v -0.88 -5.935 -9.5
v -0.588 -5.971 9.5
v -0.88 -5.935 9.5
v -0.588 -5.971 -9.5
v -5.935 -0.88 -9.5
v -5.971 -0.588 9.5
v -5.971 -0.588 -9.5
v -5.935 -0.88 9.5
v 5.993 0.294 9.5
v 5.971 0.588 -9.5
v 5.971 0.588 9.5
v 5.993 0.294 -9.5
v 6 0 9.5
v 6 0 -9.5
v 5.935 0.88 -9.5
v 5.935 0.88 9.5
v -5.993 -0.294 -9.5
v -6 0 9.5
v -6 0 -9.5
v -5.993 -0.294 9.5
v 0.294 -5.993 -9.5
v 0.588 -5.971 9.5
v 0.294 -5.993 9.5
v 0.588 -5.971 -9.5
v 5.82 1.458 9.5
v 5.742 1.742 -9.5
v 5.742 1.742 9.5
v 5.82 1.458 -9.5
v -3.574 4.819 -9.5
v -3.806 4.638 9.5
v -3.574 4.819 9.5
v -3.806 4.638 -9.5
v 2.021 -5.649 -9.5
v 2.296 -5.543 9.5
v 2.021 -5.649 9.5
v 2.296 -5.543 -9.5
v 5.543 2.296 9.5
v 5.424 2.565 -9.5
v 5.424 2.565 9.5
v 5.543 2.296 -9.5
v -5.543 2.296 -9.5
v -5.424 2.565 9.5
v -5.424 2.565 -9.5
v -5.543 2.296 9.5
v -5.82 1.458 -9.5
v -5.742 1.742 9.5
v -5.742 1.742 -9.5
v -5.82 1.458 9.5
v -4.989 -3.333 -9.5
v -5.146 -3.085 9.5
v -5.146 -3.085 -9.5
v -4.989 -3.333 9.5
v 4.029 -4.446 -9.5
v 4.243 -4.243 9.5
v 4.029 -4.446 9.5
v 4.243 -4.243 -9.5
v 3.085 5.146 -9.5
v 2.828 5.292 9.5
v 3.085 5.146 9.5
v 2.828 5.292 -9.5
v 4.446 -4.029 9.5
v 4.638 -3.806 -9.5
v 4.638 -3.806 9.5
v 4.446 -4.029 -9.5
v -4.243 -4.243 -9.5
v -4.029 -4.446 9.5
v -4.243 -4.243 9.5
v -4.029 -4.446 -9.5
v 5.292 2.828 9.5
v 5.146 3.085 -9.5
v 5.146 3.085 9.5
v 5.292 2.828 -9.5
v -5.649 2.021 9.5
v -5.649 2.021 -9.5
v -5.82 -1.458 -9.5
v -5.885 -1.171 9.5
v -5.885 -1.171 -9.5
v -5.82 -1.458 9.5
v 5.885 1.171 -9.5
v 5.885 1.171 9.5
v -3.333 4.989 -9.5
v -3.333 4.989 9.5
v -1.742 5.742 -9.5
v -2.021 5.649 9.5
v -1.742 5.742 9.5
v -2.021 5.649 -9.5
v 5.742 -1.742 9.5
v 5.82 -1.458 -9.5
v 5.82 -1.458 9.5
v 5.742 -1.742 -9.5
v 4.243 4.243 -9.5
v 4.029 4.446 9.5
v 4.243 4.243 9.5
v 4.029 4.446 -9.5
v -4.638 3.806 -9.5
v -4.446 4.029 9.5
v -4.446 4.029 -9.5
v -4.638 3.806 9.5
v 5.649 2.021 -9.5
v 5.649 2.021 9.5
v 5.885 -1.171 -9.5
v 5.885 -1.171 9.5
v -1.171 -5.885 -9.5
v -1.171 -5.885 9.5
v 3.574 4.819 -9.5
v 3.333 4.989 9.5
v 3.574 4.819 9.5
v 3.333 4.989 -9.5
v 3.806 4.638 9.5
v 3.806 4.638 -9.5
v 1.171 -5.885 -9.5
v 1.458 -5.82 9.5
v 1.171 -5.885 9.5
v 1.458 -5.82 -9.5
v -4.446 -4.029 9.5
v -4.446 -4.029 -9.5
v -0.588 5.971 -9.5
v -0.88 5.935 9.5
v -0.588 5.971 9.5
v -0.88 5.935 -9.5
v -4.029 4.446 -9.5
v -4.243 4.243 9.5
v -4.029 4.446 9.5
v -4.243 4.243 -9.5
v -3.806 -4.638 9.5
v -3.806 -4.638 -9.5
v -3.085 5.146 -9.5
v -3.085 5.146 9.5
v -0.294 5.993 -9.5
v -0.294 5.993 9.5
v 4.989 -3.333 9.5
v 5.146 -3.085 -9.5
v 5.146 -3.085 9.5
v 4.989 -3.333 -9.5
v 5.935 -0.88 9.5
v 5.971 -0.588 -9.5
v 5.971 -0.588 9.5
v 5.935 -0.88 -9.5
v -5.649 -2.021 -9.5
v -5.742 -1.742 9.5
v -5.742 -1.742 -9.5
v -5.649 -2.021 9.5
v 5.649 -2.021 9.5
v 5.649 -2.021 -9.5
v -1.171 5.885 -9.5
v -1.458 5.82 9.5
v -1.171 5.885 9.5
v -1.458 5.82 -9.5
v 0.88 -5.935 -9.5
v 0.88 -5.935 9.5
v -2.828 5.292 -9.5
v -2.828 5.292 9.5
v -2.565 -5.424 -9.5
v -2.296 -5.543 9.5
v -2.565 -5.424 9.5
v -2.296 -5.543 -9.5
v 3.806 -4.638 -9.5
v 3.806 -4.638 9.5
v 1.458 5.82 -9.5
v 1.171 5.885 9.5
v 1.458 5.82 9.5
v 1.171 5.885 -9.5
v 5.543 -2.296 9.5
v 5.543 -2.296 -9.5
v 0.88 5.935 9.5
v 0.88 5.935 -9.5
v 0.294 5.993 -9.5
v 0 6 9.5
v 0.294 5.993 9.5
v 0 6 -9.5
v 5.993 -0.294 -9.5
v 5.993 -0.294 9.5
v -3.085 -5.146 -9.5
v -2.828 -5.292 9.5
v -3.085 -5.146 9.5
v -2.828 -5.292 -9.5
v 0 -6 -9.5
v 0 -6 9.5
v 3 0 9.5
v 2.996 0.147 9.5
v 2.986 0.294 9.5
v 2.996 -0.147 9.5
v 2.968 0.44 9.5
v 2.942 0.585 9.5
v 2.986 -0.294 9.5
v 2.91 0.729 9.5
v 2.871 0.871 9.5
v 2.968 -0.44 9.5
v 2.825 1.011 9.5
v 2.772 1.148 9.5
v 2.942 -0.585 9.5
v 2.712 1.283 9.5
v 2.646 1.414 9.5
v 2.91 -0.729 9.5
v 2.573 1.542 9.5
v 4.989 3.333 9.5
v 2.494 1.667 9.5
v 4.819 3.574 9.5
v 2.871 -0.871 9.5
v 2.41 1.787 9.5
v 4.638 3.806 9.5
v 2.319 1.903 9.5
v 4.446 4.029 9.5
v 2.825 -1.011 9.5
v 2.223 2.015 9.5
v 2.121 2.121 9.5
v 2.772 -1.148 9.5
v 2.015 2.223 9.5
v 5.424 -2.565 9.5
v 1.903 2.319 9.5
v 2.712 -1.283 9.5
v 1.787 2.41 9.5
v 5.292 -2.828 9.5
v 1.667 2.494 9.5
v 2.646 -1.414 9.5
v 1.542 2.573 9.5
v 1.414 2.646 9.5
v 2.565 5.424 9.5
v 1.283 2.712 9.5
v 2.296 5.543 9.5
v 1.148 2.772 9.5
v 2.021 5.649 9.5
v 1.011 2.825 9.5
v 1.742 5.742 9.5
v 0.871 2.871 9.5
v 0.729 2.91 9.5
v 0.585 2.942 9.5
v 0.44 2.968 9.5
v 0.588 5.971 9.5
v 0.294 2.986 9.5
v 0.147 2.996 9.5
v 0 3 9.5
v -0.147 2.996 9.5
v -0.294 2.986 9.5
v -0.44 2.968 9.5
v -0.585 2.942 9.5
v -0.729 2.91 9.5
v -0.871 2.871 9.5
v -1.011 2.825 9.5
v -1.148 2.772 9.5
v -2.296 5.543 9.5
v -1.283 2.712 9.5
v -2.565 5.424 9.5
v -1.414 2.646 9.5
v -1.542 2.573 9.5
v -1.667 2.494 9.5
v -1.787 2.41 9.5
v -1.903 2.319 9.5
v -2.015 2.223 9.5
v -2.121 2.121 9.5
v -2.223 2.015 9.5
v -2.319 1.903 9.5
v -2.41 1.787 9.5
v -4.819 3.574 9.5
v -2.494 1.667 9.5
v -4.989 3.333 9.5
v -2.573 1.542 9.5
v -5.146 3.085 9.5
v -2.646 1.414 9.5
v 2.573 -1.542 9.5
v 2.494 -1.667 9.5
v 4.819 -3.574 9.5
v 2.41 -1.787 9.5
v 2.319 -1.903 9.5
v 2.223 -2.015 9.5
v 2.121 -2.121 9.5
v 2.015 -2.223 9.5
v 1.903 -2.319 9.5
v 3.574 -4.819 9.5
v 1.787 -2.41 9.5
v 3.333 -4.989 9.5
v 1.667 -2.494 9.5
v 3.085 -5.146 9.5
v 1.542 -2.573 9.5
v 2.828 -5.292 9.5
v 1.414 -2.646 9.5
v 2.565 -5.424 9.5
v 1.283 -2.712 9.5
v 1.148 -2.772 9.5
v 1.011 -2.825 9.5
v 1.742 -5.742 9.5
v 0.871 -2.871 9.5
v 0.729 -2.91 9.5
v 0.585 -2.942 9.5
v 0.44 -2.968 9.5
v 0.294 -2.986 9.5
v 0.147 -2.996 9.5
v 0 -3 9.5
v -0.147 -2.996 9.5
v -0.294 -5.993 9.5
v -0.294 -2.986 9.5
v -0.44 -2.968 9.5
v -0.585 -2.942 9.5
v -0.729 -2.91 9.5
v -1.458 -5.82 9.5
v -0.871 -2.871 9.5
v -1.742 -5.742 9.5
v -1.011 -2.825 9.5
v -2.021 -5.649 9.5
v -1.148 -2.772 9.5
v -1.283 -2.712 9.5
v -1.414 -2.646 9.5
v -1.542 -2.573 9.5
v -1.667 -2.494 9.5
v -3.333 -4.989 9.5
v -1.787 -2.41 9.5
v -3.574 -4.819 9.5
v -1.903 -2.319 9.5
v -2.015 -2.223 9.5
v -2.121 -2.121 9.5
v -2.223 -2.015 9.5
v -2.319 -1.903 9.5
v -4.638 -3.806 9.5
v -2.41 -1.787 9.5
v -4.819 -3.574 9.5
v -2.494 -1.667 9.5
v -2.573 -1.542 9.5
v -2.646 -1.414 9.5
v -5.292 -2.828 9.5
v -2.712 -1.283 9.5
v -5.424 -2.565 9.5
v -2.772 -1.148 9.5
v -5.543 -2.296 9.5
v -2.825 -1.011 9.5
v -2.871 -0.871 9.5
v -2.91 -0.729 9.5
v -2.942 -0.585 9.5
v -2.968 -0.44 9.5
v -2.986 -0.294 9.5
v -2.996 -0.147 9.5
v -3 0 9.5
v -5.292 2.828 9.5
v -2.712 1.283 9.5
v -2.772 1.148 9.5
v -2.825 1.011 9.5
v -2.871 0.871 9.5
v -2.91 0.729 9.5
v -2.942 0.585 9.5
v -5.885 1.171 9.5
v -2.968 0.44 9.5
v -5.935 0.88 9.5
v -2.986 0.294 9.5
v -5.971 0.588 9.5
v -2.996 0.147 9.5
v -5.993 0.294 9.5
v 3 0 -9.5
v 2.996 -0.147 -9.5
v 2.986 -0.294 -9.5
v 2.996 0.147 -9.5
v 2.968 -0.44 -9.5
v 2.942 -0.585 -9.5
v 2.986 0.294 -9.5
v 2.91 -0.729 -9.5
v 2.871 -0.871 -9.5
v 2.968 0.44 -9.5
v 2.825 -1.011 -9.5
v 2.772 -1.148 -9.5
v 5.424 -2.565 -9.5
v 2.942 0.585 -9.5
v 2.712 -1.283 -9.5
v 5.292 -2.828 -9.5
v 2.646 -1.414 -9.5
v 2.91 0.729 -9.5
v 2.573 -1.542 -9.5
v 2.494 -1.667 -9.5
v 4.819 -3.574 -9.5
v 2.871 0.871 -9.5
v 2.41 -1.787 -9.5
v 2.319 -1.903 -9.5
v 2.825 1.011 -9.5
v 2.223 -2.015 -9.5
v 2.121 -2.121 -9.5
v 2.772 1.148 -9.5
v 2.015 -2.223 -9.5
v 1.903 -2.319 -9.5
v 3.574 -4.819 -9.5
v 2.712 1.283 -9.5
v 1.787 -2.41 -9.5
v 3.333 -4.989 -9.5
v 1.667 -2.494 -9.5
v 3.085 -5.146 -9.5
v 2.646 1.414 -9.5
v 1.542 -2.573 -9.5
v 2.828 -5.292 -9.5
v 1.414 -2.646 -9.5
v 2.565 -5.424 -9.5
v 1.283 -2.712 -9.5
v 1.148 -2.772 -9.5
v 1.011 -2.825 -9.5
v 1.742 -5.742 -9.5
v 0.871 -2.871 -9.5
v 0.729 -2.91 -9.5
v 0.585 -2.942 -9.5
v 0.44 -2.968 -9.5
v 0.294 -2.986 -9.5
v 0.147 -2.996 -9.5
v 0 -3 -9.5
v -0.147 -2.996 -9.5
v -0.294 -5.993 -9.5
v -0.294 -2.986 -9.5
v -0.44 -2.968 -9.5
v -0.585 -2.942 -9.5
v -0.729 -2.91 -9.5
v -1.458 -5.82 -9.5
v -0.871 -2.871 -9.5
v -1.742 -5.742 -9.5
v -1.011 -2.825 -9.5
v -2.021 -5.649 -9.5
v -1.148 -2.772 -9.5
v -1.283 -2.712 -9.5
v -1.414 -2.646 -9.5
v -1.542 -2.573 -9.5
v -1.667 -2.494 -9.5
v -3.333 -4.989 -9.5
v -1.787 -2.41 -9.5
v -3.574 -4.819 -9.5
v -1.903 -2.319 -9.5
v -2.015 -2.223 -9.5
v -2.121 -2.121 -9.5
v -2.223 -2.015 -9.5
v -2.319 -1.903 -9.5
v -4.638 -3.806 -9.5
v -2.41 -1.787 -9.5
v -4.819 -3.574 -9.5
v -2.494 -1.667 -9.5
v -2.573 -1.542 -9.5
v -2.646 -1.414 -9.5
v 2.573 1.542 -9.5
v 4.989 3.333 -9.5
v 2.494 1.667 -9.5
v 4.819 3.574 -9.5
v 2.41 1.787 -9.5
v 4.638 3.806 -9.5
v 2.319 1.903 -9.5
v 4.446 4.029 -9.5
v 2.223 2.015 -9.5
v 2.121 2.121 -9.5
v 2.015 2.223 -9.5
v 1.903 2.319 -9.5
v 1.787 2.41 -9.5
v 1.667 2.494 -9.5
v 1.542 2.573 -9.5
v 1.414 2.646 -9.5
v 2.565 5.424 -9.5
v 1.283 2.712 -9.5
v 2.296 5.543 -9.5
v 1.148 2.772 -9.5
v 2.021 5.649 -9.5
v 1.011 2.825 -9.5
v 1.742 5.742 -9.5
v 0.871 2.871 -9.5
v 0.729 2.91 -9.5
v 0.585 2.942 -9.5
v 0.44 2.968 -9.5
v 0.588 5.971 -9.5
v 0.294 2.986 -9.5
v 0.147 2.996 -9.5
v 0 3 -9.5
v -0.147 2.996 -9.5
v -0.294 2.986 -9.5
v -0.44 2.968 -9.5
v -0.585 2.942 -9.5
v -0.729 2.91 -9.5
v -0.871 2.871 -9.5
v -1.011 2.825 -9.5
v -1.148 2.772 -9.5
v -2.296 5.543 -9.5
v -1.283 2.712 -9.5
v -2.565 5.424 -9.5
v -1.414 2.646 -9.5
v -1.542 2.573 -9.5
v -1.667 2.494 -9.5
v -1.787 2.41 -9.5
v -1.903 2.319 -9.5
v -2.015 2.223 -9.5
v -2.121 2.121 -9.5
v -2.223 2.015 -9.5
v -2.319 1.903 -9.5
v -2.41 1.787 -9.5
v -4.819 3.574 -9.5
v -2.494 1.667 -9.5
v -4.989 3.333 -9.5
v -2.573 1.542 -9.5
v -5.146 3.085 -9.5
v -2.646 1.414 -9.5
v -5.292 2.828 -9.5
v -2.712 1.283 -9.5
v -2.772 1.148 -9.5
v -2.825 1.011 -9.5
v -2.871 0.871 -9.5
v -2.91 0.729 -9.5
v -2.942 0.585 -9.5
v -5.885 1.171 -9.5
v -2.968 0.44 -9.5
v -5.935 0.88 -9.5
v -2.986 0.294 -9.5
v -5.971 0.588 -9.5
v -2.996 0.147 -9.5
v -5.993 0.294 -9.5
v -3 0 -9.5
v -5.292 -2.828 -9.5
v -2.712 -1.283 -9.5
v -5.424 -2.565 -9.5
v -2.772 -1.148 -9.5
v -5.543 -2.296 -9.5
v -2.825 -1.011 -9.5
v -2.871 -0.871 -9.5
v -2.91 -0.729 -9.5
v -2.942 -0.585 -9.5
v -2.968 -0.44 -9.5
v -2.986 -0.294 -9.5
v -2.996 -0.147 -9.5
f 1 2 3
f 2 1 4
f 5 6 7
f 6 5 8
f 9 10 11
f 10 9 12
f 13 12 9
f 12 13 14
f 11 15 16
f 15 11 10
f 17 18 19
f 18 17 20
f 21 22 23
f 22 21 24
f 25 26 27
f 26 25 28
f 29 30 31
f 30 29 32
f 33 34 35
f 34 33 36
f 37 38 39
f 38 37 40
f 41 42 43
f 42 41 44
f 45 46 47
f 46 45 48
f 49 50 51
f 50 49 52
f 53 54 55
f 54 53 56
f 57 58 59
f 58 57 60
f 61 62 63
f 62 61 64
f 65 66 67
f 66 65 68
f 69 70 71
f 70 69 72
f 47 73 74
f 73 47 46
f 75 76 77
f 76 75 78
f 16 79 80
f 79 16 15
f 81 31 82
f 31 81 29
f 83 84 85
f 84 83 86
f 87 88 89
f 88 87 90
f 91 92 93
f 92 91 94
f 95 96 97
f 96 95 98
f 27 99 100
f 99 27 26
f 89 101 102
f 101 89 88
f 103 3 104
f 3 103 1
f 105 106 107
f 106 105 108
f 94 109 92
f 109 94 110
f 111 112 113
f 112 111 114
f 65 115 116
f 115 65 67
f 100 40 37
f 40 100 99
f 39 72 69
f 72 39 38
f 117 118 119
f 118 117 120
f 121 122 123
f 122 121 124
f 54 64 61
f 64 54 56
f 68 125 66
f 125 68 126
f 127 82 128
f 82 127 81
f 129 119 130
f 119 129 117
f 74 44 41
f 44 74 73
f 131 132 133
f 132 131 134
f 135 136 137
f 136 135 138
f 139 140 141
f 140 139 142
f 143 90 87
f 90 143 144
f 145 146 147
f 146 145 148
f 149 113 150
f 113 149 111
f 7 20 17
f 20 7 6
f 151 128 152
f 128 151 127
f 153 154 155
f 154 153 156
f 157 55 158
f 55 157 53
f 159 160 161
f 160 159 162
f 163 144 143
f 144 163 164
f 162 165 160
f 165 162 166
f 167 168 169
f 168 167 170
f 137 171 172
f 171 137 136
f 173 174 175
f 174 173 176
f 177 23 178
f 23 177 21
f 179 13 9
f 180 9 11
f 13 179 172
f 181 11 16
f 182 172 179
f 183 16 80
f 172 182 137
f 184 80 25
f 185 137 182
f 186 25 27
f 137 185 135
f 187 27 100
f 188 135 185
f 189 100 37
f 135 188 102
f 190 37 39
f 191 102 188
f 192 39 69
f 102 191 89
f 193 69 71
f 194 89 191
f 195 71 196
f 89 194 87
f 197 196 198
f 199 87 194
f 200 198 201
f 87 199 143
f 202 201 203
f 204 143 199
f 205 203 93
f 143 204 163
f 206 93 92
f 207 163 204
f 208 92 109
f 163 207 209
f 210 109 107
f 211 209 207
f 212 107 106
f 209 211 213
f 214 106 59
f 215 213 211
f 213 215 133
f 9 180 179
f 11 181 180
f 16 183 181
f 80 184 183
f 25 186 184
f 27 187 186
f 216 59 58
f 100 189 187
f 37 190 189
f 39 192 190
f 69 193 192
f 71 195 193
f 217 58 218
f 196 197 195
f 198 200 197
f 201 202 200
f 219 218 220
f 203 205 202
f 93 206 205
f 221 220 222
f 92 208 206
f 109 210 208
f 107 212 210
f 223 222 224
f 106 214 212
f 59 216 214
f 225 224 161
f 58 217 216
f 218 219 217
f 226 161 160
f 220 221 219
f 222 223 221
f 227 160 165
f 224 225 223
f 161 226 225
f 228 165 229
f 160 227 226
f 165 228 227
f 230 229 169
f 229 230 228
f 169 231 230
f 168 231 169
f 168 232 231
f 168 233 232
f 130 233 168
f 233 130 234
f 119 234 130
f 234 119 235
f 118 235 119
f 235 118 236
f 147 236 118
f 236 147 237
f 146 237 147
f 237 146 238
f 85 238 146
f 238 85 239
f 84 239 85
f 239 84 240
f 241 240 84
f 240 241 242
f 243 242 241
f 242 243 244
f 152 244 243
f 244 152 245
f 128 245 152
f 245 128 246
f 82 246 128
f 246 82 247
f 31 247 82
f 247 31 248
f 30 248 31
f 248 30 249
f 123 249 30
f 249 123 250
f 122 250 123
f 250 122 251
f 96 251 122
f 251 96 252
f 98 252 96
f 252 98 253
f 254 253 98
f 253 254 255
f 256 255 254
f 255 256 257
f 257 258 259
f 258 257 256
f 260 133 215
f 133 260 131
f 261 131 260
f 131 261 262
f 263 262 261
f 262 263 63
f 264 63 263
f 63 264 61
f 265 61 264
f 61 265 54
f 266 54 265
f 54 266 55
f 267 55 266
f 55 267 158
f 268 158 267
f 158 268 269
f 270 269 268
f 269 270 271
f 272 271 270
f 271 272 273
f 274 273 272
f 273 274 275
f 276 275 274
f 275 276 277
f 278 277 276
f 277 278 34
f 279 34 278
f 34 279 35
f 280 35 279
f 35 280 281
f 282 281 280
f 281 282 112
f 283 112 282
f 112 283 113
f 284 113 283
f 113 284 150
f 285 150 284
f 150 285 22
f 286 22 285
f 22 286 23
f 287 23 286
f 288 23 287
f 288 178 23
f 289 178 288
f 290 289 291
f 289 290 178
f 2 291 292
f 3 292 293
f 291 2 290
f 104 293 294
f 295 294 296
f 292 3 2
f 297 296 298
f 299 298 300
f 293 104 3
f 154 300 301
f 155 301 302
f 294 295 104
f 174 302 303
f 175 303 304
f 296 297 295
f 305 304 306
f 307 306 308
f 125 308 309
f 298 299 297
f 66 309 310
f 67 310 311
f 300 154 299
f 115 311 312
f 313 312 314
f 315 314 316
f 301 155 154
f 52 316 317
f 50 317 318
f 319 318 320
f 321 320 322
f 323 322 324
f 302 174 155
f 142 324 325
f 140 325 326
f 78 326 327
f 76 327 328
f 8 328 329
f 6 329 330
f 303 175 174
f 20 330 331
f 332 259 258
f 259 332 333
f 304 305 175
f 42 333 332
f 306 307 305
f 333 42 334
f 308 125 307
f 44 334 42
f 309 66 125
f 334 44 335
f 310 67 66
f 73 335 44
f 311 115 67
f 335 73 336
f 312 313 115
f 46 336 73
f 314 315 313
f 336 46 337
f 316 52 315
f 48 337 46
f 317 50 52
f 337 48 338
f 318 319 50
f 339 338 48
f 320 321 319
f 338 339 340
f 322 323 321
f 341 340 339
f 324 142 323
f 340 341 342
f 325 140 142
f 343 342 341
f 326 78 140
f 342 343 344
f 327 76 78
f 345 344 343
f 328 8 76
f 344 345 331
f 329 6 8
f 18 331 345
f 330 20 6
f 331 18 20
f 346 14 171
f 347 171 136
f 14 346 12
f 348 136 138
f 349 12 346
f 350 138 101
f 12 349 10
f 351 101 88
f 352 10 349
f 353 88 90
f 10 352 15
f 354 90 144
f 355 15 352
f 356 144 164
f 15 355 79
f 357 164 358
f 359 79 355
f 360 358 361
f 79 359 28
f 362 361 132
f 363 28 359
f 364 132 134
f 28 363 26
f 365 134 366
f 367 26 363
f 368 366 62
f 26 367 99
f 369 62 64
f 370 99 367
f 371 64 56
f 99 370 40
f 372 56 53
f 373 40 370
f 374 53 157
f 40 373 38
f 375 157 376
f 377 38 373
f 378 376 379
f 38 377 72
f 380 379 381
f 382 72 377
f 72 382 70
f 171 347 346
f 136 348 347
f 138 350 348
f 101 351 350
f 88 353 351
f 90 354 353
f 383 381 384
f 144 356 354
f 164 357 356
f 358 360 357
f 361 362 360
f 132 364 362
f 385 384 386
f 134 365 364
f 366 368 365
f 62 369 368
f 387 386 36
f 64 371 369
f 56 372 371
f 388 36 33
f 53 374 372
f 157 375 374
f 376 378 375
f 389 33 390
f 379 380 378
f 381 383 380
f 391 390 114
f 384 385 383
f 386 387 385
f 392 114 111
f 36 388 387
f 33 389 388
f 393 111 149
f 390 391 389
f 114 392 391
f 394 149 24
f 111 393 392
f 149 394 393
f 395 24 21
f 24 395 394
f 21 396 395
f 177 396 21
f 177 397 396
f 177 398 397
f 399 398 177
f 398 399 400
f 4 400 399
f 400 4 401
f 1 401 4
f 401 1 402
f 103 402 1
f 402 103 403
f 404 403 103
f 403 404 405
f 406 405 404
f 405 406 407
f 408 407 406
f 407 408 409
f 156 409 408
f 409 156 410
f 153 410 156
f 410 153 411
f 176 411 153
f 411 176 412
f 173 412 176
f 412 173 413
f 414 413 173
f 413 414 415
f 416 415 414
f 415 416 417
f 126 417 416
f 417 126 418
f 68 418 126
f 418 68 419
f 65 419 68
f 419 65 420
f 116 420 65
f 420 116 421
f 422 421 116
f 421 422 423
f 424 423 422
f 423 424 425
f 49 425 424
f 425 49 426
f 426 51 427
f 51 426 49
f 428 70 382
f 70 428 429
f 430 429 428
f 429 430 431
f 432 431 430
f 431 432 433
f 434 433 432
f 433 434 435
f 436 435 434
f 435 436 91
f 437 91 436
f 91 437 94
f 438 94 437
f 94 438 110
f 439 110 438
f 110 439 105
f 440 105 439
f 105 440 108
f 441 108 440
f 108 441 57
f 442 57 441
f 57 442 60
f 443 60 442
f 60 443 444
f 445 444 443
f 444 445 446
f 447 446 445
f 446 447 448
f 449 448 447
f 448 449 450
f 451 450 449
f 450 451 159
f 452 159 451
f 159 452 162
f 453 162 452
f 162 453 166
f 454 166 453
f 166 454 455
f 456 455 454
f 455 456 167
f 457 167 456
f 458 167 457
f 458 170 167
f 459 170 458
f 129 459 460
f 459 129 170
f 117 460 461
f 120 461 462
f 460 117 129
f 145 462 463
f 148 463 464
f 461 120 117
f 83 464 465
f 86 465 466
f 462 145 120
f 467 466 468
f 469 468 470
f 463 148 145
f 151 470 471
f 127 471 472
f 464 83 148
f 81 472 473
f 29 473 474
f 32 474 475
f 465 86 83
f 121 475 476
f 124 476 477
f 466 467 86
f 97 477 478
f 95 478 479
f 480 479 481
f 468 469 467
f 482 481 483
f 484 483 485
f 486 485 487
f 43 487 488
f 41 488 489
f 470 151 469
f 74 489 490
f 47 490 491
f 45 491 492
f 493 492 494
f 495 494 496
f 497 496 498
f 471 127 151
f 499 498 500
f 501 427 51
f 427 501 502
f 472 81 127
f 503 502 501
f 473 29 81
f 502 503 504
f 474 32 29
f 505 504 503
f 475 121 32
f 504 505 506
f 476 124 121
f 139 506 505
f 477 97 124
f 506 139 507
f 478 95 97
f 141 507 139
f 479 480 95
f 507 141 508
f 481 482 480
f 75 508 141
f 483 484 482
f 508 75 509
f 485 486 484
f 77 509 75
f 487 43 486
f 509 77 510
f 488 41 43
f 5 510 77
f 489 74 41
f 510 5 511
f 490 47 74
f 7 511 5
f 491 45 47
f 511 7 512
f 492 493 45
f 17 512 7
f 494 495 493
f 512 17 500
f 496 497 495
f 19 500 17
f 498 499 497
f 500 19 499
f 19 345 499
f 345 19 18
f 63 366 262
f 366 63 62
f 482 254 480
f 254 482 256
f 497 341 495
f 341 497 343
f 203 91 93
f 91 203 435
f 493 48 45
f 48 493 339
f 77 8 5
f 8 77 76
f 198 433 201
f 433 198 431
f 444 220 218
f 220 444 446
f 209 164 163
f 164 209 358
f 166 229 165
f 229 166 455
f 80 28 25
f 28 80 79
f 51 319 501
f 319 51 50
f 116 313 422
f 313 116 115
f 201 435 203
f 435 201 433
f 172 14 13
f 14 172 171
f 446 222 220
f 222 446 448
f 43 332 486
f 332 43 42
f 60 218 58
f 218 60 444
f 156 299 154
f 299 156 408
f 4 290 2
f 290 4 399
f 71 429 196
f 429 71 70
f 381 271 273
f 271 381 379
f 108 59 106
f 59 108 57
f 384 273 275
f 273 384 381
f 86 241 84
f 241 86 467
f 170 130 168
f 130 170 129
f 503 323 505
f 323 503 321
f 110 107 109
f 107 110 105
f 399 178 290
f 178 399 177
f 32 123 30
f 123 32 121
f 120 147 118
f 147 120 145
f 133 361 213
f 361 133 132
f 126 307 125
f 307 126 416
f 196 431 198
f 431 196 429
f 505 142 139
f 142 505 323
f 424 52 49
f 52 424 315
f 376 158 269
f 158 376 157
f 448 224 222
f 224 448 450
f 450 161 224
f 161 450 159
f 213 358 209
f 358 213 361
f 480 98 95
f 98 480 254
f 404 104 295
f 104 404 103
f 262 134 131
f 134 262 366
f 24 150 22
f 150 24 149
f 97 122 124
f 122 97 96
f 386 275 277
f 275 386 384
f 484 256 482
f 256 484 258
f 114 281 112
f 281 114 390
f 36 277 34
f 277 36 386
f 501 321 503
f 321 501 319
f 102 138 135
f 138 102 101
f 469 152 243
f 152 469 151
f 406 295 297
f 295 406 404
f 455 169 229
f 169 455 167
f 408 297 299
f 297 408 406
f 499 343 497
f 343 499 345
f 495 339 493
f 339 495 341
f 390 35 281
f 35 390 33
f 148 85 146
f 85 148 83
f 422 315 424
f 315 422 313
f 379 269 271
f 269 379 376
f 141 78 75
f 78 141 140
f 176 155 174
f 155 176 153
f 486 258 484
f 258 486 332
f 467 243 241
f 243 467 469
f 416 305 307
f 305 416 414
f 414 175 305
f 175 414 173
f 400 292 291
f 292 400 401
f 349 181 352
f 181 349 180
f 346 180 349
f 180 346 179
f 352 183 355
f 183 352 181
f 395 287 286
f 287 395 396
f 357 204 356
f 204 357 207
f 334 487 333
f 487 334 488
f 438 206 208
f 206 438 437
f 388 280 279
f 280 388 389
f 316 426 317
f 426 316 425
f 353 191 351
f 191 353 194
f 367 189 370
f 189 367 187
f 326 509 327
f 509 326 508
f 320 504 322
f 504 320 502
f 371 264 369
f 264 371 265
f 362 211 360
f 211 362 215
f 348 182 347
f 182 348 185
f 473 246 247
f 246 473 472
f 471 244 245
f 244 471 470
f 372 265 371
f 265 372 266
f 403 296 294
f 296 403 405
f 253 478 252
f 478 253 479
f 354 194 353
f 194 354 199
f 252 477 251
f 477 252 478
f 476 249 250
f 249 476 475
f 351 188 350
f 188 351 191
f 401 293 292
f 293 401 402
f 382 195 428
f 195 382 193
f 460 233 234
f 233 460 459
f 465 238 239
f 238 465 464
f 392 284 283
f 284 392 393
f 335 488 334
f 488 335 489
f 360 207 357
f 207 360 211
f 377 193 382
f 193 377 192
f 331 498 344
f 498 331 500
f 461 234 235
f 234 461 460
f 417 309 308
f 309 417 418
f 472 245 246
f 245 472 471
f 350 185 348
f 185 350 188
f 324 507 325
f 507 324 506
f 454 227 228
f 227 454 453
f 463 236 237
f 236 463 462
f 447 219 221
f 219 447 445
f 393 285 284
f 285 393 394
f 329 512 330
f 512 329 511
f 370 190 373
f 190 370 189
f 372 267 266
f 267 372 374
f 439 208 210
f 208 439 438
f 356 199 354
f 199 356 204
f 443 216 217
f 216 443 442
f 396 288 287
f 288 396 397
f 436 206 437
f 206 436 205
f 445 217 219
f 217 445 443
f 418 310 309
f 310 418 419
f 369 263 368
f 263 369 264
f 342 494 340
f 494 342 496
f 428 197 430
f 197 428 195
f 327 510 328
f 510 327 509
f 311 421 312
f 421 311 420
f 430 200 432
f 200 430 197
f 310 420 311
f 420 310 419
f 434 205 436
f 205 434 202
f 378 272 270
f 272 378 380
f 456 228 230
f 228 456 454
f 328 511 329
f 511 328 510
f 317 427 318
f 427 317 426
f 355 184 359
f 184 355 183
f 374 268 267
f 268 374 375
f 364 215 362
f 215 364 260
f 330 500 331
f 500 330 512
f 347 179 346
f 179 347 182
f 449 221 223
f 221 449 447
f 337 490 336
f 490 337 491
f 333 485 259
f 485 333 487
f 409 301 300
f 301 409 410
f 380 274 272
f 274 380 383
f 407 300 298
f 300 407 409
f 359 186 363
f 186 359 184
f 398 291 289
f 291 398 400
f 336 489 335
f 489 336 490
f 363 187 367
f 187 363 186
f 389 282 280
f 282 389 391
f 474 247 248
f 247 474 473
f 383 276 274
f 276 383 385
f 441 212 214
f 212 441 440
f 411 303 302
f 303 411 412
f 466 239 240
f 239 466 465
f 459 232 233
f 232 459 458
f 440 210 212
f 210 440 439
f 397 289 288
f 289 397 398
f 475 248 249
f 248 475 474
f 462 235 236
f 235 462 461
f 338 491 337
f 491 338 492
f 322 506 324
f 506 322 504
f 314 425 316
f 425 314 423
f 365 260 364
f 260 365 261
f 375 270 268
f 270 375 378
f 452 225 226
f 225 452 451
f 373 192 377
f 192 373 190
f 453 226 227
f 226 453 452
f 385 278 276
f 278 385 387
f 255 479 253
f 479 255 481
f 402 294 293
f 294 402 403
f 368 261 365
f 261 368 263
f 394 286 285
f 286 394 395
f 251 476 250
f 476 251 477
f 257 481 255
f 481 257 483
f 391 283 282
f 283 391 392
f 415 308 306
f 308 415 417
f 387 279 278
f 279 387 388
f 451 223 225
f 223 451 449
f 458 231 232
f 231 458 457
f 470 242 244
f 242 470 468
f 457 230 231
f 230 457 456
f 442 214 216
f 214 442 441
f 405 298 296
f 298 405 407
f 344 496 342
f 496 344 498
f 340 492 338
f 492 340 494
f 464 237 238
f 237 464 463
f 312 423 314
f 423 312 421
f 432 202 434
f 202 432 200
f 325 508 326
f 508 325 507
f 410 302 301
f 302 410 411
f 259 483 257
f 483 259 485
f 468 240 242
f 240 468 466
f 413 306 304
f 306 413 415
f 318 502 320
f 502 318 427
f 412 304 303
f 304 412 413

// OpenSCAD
// Linear bearing (simple, standard) — 6mm ID, 12mm OD, 19mm length
// One connected solid (single part), no side features.

bore_diameter_mm  = 6.0;   //[3.0:12.0:0.1]
outer_diameter_mm = 12.0;  //[6.0:24.0:0.1]
length_mm         = 19.0;  //[10.0:38.0:0.1]

eps_mm = 0.05;             //[0.01:0.2:0.01]
$fn = 128;                 // ensure smooth cylindrical bore/OD

module linear_bearing_simple() {
    difference() {
        // Outer cylinder (OD)
        cylinder(d=outer_diameter_mm, h=length_mm, center=true);

        // Inner bore (ID) - slightly extended to guarantee clean subtraction
        cylinder(d=bore_diameter_mm, h=length_mm + 2*eps_mm, center=true);
    }
}

linear_bearing_simple();
